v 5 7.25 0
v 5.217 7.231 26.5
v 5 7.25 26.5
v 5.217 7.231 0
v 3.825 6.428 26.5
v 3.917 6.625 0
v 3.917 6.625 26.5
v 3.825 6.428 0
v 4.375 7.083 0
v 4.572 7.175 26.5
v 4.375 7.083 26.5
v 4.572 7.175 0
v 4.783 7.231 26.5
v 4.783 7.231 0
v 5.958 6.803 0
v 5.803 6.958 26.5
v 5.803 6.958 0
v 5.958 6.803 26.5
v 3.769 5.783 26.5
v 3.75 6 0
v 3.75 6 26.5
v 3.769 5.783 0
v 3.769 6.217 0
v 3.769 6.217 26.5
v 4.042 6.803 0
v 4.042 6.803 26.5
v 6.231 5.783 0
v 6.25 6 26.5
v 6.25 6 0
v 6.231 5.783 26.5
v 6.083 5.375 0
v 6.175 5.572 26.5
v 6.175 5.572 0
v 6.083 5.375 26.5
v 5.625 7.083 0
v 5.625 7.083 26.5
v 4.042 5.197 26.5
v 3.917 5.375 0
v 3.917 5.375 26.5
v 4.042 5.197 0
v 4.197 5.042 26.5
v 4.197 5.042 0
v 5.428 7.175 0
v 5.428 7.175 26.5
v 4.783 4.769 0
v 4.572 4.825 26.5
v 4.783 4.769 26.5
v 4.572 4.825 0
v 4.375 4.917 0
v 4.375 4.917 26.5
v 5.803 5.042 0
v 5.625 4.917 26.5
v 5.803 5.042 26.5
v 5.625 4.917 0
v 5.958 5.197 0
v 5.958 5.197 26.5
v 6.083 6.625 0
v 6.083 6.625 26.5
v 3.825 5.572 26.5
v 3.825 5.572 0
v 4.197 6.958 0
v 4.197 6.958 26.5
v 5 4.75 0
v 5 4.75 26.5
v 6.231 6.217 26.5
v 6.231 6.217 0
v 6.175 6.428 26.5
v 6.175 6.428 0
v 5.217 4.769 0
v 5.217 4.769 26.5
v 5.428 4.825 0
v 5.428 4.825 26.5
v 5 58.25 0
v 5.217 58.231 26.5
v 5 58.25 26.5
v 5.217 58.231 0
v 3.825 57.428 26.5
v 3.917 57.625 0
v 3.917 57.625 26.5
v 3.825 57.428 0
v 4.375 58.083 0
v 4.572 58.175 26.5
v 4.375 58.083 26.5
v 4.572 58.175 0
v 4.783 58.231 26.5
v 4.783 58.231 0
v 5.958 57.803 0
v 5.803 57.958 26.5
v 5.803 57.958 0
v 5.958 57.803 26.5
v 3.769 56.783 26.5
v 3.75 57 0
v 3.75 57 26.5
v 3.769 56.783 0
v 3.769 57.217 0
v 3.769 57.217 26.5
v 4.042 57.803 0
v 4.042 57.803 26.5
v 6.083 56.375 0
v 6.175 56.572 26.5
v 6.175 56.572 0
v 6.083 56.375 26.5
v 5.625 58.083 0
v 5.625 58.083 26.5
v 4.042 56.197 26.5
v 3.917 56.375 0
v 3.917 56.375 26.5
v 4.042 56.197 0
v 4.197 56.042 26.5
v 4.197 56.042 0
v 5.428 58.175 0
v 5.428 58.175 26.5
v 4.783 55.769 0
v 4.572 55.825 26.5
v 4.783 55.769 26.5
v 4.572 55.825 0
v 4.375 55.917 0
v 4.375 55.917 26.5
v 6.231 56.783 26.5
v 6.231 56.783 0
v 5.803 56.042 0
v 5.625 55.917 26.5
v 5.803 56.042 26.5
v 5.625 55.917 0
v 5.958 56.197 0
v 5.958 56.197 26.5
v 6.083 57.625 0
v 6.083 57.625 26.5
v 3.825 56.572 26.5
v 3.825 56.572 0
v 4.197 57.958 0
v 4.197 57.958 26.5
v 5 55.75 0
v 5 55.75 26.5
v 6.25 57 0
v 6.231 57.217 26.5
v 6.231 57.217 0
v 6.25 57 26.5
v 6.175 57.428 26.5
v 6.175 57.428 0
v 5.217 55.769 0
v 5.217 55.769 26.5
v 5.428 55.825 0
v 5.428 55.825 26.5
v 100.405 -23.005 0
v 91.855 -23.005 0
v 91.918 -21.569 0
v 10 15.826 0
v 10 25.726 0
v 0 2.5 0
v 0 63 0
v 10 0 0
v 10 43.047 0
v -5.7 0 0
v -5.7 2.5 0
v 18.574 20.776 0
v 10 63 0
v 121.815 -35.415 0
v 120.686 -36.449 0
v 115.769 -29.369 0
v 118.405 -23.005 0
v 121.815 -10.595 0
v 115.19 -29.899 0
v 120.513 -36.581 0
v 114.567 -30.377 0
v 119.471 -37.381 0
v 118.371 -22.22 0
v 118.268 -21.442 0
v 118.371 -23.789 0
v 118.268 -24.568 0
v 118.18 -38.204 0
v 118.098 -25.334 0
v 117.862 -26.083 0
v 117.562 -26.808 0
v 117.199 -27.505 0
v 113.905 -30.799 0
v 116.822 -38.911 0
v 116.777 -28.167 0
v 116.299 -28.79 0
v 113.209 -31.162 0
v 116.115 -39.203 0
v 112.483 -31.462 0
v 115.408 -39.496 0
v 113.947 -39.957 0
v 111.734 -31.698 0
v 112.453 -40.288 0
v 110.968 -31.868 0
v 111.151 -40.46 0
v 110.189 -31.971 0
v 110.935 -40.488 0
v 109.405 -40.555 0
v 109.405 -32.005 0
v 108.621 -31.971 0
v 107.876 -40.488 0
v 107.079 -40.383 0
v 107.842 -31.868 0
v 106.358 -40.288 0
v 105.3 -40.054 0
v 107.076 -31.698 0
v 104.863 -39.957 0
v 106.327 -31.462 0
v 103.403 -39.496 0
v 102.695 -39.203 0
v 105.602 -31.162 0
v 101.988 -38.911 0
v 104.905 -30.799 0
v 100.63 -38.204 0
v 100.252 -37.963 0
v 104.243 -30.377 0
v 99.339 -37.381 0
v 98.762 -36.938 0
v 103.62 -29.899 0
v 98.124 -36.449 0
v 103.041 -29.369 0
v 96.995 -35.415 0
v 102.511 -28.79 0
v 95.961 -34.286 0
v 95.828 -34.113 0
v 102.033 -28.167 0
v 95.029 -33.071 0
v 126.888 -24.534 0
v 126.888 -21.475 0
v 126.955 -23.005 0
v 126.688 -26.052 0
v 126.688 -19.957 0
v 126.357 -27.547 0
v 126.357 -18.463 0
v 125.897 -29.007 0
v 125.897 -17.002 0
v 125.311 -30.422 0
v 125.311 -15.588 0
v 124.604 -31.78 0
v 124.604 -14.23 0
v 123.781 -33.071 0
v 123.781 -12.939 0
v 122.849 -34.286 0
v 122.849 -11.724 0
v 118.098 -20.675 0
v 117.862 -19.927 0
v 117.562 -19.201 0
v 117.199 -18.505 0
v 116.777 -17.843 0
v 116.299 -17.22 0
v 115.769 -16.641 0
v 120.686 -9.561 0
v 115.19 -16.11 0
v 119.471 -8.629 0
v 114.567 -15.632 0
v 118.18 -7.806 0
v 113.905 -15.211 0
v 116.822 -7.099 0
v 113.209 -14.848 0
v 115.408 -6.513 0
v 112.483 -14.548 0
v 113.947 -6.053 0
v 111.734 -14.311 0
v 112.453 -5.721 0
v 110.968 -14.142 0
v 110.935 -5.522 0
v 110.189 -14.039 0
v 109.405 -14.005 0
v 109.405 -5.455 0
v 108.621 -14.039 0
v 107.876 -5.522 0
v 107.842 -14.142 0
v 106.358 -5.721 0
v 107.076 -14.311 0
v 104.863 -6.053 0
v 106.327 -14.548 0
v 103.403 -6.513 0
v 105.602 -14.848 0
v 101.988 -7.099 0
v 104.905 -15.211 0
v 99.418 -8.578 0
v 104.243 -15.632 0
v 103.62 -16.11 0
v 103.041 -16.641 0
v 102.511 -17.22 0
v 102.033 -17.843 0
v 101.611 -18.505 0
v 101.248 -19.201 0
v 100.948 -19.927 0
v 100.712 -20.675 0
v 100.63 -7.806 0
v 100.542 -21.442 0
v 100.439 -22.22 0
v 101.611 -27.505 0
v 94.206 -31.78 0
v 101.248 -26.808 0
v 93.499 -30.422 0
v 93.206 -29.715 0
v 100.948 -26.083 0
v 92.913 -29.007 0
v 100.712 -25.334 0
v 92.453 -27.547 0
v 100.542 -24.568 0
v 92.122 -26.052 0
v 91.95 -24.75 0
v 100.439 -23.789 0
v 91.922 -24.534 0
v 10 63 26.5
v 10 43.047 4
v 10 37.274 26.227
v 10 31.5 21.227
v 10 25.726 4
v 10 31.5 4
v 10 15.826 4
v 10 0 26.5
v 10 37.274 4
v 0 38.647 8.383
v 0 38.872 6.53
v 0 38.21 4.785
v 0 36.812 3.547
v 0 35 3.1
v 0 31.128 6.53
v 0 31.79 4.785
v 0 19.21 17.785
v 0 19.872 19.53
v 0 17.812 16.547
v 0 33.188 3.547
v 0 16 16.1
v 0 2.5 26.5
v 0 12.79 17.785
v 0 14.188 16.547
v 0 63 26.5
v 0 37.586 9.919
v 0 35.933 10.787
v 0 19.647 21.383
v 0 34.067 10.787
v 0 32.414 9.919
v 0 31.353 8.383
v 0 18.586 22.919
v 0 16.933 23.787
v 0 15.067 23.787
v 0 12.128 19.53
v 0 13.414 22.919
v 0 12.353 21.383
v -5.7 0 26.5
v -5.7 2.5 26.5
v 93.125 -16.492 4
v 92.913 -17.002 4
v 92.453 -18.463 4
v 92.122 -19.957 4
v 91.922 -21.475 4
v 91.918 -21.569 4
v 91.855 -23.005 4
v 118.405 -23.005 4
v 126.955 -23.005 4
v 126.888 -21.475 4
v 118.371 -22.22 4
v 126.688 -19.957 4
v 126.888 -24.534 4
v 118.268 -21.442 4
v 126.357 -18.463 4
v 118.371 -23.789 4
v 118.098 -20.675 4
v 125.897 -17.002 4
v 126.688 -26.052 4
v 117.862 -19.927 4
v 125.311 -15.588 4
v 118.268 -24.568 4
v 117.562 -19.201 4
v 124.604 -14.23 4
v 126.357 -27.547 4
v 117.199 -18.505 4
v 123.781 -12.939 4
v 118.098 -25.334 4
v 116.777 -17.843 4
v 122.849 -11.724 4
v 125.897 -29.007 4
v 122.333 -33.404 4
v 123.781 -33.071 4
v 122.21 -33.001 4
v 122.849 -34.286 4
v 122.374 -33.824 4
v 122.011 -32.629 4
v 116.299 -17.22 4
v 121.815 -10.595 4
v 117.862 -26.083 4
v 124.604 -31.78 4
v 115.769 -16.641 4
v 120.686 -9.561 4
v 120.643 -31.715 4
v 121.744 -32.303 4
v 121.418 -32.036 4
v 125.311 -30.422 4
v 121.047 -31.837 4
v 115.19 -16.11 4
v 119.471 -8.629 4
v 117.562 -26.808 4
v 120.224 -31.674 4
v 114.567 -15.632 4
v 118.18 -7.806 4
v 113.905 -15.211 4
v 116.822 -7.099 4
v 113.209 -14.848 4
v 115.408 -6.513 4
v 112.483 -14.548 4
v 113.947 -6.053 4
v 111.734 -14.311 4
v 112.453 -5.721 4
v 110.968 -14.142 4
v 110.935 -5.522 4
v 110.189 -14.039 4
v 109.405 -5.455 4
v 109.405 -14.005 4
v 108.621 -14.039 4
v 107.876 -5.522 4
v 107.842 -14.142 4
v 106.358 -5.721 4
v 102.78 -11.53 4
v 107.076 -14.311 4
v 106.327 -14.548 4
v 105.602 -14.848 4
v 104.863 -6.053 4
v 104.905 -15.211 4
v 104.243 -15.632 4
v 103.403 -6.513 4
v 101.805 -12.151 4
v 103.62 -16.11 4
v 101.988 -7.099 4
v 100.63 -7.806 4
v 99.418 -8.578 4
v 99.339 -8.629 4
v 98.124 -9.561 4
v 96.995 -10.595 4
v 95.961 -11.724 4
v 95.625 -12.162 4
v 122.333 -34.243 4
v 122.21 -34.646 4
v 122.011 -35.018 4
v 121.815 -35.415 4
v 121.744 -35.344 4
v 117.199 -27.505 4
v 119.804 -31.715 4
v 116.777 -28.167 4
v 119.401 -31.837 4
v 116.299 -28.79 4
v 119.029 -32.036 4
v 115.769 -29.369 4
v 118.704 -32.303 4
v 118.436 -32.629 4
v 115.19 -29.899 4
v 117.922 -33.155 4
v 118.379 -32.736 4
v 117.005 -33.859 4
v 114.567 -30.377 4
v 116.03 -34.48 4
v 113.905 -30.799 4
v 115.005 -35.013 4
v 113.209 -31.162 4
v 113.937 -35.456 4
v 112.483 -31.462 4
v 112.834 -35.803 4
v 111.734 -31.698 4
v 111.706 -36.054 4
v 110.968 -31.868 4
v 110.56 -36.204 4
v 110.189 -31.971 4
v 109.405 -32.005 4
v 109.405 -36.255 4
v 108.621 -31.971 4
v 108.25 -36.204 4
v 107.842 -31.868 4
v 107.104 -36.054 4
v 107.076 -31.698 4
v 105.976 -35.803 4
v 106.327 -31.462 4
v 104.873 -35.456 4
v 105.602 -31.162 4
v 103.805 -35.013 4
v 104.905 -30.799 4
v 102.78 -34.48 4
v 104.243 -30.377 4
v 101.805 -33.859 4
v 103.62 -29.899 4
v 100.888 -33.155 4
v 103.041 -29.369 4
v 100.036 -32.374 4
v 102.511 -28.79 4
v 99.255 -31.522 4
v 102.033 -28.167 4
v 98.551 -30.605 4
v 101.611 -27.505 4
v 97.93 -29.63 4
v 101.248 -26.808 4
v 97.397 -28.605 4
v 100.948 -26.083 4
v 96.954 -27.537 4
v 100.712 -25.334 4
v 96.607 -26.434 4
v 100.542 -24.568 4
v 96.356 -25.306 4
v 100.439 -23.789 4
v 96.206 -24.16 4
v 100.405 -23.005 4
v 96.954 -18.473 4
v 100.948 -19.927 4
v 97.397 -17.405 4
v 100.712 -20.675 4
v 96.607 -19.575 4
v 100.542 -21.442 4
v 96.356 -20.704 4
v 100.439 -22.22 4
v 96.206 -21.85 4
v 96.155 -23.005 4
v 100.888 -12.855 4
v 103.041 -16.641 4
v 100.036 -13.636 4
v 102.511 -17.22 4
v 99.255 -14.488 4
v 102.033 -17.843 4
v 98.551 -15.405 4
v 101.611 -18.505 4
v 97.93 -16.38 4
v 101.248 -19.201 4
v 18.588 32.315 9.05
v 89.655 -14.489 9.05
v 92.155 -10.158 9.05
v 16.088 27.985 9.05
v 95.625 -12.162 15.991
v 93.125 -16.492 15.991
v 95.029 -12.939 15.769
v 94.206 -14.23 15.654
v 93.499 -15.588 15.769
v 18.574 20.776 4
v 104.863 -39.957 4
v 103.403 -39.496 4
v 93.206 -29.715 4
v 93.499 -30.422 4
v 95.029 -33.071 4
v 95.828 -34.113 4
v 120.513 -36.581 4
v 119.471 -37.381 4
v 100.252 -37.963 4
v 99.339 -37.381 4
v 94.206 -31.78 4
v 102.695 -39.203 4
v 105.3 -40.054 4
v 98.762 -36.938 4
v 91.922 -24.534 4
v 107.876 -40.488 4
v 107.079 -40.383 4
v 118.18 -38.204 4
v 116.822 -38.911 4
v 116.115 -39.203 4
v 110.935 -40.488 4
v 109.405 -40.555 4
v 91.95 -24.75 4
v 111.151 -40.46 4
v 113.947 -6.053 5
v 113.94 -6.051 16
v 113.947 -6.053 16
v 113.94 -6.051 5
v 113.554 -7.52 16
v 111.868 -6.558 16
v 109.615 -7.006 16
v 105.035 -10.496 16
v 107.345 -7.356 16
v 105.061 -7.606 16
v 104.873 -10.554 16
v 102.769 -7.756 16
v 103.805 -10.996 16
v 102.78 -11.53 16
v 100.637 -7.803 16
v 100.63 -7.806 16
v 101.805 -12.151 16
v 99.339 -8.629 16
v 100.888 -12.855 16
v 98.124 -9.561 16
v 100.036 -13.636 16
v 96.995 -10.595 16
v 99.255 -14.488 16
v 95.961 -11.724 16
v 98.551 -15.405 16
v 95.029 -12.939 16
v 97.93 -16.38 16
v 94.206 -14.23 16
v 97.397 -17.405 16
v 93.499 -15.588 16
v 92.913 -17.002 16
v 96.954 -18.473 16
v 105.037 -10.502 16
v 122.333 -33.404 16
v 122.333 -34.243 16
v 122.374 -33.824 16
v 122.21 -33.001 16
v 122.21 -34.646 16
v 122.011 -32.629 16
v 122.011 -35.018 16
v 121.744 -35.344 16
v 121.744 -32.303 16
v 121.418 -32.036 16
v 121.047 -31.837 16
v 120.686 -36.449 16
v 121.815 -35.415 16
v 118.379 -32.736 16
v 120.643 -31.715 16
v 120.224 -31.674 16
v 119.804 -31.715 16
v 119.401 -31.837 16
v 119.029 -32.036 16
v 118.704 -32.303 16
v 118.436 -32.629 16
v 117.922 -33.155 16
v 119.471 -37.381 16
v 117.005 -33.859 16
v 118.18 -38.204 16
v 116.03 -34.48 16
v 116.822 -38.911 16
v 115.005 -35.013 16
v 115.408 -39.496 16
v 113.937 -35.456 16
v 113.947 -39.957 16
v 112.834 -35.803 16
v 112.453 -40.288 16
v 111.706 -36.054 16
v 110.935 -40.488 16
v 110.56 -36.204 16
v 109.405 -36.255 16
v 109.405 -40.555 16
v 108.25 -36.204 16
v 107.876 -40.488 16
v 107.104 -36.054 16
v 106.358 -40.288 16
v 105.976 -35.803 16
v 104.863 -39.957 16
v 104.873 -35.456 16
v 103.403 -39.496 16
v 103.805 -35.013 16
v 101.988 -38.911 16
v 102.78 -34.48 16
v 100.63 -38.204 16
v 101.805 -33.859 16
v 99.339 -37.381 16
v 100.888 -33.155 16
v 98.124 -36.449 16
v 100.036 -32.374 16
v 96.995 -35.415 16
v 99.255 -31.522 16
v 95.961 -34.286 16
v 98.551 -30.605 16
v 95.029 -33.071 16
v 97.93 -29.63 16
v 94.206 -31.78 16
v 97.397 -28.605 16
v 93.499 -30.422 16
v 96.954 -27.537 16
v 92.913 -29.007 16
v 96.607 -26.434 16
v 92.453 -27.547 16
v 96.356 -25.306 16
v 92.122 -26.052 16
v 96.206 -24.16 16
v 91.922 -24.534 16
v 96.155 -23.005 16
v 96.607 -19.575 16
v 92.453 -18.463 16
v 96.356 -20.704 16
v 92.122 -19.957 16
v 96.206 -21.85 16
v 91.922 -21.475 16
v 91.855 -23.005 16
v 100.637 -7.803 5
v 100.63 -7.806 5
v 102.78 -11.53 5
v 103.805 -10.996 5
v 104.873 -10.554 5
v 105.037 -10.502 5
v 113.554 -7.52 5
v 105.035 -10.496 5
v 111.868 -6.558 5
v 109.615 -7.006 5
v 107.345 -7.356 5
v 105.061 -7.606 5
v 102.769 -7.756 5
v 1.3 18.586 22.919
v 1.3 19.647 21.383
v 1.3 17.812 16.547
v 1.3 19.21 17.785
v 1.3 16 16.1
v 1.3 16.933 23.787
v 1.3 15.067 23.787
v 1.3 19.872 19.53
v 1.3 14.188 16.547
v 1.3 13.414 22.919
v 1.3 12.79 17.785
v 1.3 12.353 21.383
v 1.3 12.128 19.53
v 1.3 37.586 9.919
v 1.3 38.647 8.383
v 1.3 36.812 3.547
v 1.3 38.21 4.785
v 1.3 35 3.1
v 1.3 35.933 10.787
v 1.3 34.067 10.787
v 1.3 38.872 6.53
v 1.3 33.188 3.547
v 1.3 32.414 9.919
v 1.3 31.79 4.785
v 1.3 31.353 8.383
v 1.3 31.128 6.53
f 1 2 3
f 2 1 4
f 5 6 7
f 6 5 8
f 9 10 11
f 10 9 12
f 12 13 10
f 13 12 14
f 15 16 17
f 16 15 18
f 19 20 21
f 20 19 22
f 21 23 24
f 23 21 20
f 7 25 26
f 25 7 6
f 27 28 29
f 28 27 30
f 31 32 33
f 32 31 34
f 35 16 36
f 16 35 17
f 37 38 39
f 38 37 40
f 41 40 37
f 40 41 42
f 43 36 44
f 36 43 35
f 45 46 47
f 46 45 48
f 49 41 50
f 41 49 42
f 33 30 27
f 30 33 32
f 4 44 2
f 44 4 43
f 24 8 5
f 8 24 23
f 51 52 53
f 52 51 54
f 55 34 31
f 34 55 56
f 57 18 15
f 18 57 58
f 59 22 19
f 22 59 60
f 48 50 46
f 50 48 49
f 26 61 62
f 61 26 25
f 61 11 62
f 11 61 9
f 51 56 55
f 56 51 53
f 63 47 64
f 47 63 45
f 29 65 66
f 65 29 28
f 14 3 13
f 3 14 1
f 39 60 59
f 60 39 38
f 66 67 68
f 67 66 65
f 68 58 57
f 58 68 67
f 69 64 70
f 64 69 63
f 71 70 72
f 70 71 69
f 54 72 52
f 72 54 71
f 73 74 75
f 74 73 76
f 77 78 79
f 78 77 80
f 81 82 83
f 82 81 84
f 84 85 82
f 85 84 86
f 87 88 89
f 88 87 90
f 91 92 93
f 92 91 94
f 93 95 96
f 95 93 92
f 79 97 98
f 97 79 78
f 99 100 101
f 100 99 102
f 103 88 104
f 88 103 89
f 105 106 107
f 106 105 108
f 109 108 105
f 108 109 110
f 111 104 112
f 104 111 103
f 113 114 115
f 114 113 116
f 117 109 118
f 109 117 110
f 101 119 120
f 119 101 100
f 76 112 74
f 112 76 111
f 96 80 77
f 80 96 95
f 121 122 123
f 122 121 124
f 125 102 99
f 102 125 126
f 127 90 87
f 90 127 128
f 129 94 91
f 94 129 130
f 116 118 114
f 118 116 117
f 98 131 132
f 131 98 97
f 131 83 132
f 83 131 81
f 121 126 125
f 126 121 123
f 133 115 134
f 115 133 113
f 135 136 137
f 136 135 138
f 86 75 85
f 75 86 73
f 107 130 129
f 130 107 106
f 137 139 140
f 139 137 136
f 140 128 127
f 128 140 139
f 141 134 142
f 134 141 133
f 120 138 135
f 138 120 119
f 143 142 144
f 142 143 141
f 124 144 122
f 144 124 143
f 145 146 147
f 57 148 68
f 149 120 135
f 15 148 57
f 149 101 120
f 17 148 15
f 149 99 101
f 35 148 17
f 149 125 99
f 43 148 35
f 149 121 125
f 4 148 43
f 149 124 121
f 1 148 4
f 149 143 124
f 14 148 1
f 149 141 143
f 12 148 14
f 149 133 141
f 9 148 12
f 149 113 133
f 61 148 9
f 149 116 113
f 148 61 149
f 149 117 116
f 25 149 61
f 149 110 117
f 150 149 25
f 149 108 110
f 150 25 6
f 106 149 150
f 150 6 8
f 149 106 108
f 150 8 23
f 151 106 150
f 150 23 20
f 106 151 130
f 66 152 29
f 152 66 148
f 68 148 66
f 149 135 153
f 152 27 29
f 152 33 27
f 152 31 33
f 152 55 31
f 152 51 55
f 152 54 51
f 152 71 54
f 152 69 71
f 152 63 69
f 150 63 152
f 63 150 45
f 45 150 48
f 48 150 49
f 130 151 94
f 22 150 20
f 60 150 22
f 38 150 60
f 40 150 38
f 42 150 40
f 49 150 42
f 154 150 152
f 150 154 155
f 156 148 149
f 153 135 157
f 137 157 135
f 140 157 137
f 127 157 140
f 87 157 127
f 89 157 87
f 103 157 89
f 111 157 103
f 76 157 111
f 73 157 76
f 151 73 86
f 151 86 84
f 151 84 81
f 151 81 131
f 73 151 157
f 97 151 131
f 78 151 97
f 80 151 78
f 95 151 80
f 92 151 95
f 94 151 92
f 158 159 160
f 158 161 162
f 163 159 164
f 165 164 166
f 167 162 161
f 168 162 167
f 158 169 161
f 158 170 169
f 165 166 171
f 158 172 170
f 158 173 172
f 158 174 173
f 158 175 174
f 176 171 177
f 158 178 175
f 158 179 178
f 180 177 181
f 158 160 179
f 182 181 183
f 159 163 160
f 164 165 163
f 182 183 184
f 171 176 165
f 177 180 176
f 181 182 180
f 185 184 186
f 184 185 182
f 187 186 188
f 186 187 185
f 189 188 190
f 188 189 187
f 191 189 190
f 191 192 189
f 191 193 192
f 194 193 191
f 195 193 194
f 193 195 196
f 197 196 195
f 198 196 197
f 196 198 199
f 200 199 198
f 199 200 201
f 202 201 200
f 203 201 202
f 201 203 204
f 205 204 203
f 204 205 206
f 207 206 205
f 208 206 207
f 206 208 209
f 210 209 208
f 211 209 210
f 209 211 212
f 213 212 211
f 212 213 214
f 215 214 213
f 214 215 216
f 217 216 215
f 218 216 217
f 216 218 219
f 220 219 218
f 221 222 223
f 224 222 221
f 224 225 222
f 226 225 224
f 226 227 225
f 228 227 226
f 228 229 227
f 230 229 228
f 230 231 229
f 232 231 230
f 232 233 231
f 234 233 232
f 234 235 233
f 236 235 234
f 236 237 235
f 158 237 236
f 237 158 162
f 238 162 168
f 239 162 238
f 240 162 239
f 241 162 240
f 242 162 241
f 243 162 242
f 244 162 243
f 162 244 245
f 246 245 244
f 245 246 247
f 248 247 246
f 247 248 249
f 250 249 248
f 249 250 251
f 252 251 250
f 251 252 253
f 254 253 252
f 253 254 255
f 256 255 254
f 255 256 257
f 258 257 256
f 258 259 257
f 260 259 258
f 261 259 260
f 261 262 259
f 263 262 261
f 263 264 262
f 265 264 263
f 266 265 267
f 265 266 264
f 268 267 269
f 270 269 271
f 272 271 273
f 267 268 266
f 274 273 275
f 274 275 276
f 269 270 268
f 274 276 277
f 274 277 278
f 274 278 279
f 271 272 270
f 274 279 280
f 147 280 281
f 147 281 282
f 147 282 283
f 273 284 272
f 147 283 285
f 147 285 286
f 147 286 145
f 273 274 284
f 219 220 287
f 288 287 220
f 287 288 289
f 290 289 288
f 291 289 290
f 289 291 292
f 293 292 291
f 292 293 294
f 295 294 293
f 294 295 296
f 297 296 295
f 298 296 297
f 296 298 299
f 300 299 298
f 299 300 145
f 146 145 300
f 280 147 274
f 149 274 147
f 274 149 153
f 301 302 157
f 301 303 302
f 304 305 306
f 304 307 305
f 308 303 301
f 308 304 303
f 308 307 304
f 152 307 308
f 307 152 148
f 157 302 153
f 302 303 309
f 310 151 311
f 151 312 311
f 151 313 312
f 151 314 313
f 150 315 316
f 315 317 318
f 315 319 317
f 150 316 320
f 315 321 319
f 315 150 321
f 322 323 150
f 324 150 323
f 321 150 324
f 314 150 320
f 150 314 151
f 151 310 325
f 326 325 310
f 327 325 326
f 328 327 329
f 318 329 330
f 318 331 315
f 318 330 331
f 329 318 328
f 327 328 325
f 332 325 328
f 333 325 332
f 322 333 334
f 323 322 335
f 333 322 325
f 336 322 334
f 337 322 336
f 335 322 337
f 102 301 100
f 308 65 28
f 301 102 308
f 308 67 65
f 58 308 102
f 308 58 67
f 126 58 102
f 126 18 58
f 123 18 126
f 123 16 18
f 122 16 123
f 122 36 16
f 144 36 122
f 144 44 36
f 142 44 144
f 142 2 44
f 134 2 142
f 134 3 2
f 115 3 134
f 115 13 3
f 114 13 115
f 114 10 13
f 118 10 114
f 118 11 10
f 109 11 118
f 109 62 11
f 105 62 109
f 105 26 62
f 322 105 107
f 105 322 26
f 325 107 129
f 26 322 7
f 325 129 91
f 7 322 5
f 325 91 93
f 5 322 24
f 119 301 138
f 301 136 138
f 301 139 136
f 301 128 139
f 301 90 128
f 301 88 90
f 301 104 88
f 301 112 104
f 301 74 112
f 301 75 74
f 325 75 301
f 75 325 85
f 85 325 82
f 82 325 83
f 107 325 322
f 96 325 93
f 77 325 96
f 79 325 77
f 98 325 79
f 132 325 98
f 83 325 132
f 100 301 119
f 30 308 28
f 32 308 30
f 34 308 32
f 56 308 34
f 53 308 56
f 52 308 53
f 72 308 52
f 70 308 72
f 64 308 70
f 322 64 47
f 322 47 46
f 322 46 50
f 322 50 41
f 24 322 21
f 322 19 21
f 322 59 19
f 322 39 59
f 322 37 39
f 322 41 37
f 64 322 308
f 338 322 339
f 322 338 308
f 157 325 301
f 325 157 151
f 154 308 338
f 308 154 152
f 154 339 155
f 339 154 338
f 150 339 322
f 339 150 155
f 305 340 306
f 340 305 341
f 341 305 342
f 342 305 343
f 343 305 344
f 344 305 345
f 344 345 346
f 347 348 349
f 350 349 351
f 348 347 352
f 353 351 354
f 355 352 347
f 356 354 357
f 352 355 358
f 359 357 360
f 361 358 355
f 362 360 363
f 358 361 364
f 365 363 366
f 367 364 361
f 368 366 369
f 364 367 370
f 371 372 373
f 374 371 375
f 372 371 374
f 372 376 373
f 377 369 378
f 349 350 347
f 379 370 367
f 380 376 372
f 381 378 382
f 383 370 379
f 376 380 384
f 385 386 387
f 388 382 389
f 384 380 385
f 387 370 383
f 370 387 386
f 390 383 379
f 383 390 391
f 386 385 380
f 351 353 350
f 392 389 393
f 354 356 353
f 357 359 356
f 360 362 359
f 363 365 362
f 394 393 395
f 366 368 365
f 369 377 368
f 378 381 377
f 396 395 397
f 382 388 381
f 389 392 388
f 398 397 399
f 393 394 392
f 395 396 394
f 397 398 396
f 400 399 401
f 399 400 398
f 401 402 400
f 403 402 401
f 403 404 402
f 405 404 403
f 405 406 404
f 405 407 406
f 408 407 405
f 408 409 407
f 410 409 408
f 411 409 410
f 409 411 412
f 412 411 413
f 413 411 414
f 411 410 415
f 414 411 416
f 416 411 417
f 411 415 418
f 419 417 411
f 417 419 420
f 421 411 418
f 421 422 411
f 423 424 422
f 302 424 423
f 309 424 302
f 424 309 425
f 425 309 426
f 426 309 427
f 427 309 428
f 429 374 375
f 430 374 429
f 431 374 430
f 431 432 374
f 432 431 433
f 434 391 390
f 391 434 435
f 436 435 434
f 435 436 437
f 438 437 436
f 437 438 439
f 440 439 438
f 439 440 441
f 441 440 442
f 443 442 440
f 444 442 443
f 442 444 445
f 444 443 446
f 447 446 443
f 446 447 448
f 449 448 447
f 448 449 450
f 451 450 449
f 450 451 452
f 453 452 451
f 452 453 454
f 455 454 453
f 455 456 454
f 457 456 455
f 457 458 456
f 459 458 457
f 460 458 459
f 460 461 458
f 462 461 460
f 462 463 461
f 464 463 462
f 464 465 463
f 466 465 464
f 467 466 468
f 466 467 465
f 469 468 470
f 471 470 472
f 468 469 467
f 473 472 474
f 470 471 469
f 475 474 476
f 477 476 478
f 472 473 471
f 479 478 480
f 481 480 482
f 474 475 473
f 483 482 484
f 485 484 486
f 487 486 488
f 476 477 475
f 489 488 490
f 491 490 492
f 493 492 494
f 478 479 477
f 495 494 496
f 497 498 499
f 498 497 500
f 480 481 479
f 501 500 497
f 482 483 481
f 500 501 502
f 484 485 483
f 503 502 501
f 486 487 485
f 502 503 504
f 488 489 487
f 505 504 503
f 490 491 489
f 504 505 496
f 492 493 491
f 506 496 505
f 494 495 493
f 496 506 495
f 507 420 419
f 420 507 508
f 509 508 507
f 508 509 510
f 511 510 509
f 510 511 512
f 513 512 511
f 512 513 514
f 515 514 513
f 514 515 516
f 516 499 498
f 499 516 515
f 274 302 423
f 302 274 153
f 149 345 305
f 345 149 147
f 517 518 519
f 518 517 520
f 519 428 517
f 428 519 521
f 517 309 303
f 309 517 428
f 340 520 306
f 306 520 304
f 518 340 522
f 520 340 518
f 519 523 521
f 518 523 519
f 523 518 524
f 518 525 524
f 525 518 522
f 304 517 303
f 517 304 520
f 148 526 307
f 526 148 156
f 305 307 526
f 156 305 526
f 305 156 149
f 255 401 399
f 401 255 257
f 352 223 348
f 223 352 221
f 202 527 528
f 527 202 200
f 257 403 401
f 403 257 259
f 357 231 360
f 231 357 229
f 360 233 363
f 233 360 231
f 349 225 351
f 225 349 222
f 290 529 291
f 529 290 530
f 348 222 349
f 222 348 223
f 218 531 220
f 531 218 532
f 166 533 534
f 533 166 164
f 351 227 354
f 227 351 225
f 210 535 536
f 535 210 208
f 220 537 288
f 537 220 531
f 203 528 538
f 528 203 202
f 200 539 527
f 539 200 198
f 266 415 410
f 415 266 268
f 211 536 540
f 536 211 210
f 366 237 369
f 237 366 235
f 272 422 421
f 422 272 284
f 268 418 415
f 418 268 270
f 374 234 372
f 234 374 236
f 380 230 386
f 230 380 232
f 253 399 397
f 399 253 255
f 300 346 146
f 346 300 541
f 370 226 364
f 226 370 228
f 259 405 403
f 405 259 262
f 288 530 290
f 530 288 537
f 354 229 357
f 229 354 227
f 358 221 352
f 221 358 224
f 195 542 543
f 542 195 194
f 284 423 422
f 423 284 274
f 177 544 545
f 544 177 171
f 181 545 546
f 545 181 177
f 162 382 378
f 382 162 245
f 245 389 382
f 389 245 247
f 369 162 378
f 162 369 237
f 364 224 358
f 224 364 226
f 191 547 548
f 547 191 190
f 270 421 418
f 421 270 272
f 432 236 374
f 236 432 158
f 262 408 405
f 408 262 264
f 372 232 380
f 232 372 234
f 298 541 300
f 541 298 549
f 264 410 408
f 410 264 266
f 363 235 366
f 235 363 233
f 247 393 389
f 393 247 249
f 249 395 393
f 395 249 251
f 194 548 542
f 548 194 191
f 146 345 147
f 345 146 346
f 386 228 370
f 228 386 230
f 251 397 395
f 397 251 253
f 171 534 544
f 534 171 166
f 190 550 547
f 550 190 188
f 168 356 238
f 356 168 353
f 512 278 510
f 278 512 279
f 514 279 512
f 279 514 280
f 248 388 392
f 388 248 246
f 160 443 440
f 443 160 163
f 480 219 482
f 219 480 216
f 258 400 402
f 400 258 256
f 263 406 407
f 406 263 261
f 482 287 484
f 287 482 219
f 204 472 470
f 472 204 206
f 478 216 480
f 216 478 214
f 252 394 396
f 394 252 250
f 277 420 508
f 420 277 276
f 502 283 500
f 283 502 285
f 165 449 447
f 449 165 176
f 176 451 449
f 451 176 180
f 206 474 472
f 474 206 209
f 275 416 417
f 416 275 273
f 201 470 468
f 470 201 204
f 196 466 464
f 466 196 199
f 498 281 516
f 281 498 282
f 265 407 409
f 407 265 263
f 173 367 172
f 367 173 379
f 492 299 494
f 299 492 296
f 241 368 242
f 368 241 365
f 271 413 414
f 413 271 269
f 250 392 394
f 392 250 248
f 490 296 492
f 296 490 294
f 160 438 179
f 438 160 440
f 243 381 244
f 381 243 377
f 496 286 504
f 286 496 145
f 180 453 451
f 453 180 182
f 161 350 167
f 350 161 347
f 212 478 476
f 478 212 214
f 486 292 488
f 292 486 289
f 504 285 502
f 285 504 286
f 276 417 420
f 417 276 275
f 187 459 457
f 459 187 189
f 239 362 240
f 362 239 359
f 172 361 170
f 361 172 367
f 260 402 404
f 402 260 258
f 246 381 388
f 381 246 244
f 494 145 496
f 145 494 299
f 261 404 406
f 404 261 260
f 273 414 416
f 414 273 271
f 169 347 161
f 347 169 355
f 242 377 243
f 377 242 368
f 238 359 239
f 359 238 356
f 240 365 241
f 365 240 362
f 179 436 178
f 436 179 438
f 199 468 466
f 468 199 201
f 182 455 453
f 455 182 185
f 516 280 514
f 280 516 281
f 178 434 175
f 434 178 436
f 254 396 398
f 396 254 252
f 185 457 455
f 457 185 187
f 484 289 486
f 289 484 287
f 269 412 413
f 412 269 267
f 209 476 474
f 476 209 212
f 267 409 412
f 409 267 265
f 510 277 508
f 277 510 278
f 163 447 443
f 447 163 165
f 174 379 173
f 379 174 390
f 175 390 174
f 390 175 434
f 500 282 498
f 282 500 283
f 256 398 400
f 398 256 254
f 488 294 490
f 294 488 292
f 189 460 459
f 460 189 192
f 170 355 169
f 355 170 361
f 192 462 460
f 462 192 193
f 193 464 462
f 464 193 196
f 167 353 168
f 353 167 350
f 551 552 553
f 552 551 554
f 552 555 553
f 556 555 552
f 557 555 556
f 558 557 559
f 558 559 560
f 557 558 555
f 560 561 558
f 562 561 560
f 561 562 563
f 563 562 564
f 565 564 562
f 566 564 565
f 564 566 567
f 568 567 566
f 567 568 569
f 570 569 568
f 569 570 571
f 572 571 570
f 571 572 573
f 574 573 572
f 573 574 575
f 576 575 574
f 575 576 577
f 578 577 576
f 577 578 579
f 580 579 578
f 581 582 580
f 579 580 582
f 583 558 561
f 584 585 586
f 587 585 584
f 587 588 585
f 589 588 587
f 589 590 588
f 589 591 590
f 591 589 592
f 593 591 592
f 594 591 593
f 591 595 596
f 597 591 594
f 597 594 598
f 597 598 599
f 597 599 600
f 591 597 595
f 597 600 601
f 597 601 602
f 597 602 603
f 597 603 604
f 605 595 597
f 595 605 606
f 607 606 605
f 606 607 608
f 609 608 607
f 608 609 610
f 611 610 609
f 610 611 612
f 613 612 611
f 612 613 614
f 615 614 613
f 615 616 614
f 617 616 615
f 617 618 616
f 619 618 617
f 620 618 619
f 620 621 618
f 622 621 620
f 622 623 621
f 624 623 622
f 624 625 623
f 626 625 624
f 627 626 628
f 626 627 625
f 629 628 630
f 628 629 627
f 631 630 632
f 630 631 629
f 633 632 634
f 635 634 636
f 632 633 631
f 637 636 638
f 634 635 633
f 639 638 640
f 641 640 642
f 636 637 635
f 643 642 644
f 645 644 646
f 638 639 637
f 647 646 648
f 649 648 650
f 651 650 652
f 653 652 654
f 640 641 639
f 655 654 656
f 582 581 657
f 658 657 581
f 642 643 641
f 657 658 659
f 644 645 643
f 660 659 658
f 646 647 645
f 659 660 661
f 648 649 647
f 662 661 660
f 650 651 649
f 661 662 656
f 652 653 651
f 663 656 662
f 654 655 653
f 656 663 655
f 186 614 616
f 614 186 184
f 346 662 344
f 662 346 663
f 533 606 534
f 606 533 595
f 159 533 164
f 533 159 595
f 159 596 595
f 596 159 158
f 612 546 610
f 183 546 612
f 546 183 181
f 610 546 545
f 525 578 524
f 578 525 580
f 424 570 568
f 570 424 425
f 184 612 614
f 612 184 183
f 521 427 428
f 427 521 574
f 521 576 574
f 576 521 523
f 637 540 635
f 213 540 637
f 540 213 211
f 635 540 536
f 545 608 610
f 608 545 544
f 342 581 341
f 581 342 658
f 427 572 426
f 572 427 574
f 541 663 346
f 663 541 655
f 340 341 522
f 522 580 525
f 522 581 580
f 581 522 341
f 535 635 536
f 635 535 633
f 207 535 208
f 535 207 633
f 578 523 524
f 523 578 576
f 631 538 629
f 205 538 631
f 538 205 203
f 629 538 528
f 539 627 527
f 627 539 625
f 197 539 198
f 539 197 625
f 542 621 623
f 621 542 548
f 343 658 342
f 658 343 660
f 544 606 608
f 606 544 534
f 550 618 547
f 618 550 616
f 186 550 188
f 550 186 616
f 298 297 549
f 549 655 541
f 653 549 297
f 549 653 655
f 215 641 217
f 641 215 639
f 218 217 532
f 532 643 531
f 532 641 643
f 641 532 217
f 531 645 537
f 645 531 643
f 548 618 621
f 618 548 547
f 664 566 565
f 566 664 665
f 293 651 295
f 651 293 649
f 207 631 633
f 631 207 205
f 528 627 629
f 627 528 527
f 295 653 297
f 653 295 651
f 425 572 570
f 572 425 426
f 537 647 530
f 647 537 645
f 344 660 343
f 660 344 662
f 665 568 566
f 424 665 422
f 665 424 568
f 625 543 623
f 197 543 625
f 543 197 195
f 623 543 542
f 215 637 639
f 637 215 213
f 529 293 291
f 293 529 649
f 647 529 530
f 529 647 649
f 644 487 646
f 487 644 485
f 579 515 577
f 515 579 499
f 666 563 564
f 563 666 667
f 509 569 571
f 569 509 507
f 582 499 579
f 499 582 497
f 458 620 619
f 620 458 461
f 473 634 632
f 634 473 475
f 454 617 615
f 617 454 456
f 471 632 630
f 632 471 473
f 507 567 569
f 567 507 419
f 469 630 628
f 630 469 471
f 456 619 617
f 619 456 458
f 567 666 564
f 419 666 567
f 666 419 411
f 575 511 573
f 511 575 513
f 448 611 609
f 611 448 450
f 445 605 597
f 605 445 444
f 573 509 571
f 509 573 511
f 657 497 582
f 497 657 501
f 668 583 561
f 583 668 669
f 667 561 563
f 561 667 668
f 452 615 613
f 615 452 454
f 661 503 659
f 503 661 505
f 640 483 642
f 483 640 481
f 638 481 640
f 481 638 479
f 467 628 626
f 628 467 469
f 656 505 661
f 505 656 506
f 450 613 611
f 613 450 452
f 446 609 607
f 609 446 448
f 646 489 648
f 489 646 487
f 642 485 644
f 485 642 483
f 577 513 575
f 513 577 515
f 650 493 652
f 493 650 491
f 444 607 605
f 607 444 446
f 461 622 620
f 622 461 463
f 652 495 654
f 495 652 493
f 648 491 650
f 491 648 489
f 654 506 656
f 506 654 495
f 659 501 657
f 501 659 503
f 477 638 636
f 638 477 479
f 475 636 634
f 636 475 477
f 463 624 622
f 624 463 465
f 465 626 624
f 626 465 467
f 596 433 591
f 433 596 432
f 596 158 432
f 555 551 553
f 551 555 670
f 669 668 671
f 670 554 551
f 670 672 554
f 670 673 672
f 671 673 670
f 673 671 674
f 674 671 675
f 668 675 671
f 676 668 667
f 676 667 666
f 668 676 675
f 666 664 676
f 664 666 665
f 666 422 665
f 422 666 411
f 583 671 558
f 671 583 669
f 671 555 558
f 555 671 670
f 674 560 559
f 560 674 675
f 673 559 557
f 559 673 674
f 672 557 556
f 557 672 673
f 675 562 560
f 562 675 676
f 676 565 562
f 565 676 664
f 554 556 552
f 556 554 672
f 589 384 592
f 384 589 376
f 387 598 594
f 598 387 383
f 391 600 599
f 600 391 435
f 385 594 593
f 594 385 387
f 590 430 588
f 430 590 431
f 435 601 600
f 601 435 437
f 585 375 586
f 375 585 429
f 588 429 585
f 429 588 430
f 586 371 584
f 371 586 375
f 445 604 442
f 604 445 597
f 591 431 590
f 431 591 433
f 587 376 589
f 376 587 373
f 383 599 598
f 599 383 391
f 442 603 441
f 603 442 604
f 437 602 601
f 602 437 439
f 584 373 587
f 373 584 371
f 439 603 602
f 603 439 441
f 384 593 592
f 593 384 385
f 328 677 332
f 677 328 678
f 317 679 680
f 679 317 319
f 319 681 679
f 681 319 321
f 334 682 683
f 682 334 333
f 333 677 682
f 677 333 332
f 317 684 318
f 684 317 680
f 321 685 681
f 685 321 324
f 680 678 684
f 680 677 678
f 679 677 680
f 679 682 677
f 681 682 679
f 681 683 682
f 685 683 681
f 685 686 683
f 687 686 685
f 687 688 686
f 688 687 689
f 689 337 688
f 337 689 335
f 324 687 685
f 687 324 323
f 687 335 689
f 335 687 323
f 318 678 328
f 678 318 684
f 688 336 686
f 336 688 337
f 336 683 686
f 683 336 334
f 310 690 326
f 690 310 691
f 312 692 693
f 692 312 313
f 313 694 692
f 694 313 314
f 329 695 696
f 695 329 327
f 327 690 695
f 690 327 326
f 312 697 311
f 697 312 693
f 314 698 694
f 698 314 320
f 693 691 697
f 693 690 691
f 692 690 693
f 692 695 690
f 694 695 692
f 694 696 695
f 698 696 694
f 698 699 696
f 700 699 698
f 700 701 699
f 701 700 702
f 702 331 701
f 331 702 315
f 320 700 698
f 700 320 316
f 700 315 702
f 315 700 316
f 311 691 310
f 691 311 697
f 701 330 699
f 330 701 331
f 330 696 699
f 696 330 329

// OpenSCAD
part = "lt"; // [rt:Right tower,lt:Left tower,orb:Outer right bracket,olb:Outer left bracket,irb:Inner right bracket,ilb:Inner left bracket,rtb:Right tower with bracket,ltb:Left tower with bracket]

// How you plan to mount the holder
positioning = 1; // [0:Anywhere along top frame,1:Flush against back (notched brackets)]

// Extra length for back lip, when positioning is flush against back
back_lip_extra_length = 2; // [0:5]

// Arm length; pipe distance from top of printer is arm_length*cos(arm_angle) - clip_inner_diameter/2
arm_length = 122;  // [110:180]
// Arm inclination (towards back); default 30
arm_angle = 30; // [5:45]

// Length of base
base_size = 63;  // [63:73]

// Inner diameter of pipe clip
clip_inner_diameter = 26.5; // [26.4:.75in pipe (tight),26.7:.75in pipe (exact),33.2:1in pipe (tight),33.4:1in pipe (exact)]
// Thickness of pipe clip; must be smaller or equal to clip head thickness (keep larger than 4)
clip_thickness = 8.6;
// Diameter of clip end hole
clip_head_inner_diameter = 18; // [0:23]
// Clip end rim size
clip_head_rim_thickness = 0; // [0:10]
// Clip lip thickness
clip_edge_thickness = 1.5;
// Clip rotation; you may want to adjust if you change arm_angle (30-arm_angle will keep gap orientation unchanged)
clip_angle = 0; // [-20:30]
// Clip lip curvature multiplier (1 to 3 recommended; higher is less curved)
clip_lip_curvature = 1.5;
// Arm side buttress base width; may want to adjust if you change arm angle
arm_buttress_width = 10; // [3:15]

/* [Hidden] */

back_pos = (positioning != 0);

// Base parameters
base_d = base_size;
base_h = 10;
base_w = 26.5;
screw_r = 1.25;
screw_dist = 51;

// Arm parameters
arm_len = arm_length;
arm_thk = 4;
arm_w = 15;
arm_rib = 5;
//arm_angle = 30;
arm_butt_w = arm_buttress_width;


// Clip parameters
clip_h = 4;
clip_od = clip_inner_diameter + clip_thickness + clip_head_rim_thickness;
clip_id = clip_head_inner_diameter;
lip_h = 16;  // includes clip_h
lip_od = clip_inner_diameter + clip_thickness;
lip_id = clip_inner_diameter;
lip_edge_thk = clip_edge_thickness;
lip_phi = 120;
lip_dphi = 75 + clip_angle;
lip_gap_phi = 45;
lip_gap_dphi = lip_dphi - lip_gap_phi;
lip_gap_h = 1;
lip_shave_r = lip_od*clip_lip_curvature;

// Solidoodle frame
sd_slack = 0.2;
sd_frame_thk = 1 + sd_slack;   // sheet metal
sd_toph_w = 26 + sd_slack;  // horizontal
sd_backv_w = 45.5 + sd_slack;  // vertical

rivet_r = 6.3/2 + 0.75;
rivet_h = 1 + 0.3;

// Bracket parameters
bracket_len = base_d;
bracket_thk = 2.5;
bracket_screw_r = 1.75;
bracket_screw_head_r = 2.75;
bracket_screw_head_h = 1.25;
bracket_screw_hole_dist = screw_dist;
bracket_screw_hole_ofs = 5;

// Extra
back_lip_len = bracket_thk + sd_frame_thk + back_lip_extra_length;  // same as inner bracket width

// phi <= 180
module cylinder_hollow(h, od, id, phi, d_phi=0) {
  rotate([0,0,d_phi]) difference() {
    cylinder(h, od/2, od/2, $fn=72);
    translate([0,0,-0.1]) cylinder(h+0.2, id/2, id/2, $fn=72);
    if (phi != 0) {
      translate([0,0,-0.1]) linear_extrude(height=h+0.2, twist=0) polygon([[0,0], [od,0], [cos(phi/2)*od, sin(phi/2)*od], [cos(phi)*od, sin(phi)*od]], convexity=2);
    }
  }
}

// phi <= 180
module cylinder_hollow_n(h, od, id, phi, d_phi=0) {
  rotate([0,0,d_phi]) intersection() {
    difference() {
      cylinder(h, od/2, od/2, $fn=72);
      translate([0,0,-0.1]) cylinder(h+0.2, id/2, id/2, $fn=72);
    }
    translate([0,0,-0.1]) linear_extrude(height=h+0.2, twist=0) polygon([[0,0], [od,0], [cos(phi/2)*od, sin(phi/2)*od], [cos(phi)*od, sin(phi)*od]], convexity=2);
  }
}

module buttress_w(thk, w, phi) {
  h = w*tan(phi);
  linear_extrude(height=thk, twist=0) polygon([[0,0],[w,0],[w,h]], convexity=2);
}

module buttress_h(thk, h, phi) {
  w = h/tan(phi);
  linear_extrude(height=thk, twist=0) polygon([[0,0],[w,0],[w,h]], convexity=2);
}




module base(lt_holes=true, rt_holes=true) {
  difference() {
    cube([base_w, base_d, base_h]);
    if (rt_holes) {
      translate([-1, (base_d-screw_dist)/2, base_h/2]) rotate([0,90,0]) cylinder(base_w/2+1+1,screw_r,screw_r, $fn=36);
      translate([-1, (base_d+screw_dist)/2, base_h/2]) rotate([0,90,0]) cylinder(base_w/2+1+1,screw_r,screw_r, $fn=36);
    }
    if (lt_holes) {
      translate([-1+base_w/2, (base_d-screw_dist)/2, base_h/2]) rotate([0,90,0]) cylinder(base_w/2+1+1,screw_r,screw_r, $fn=36);
      translate([-1+base_w/2, (base_d+screw_dist)/2, base_h/2]) rotate([0,90,0]) cylinder(base_w/2+1+1,screw_r,screw_r, $fn=36);
    }
    *union() {  // Test print only 
      translate([-1, -base_d/2-2.5, 0]) cube([base_w, base_d, base_h]);
      translate([-1, base_d/2+2.5, 0]) cube([base_w, base_d, base_h]);
    }
  }
  if (back_pos) {
    translate([0,0,-back_lip_len]) cube([base_w, bracket_thk, back_lip_len+base_h]);
  }
}

module arm(left=0) {
  sb = left;
  ss = 1 - 2*sb;
  l = arm_len - sqrt(clip_od*clip_od - arm_w*arm_w)/2 + 0.2;
  union() {
    // Main
    cube([arm_thk, arm_w, l]);
    // Reinforcement
    translate([-sb*arm_rib + ss*0.05, (arm_w-arm_rib)/2, 0]) cube([arm_thk+arm_rib,arm_rib, l]);
    // Clip buttress
    translate([ss*lip_h + sb*arm_thk, (arm_w+ss*arm_rib)/2, arm_len-lip_od/2+0.2]) rotate([-90,0,(1-sb)*180]) buttress_w(arm_rib,lip_h-arm_rib-arm_thk, 30);
    // Side buttress
    translate([ss*(base_w - 0.1) + sb*arm_thk, (arm_w-ss*arm_rib)/2, base_h/cos(arm_angle)-tan(arm_angle)*(arm_w+arm_rib)/2 - 0.1]) rotate([-90, 180, sb*180]) buttress_w(arm_rib, base_w-arm_rib-arm_thk, 30);
    // Back buttress
    translate([arm_thk,0,base_h/cos(arm_angle)-0.1]) rotate([90,-arm_angle,-90]) linear_extrude(height=arm_thk, twist=0) polygon([[0,0],[arm_butt_w,0],[0.5*arm_butt_w,0.5*arm_butt_w*tan(90-arm_angle)]], convexity=2);
  }
}

module clip(left=0) {
  sb = left;  // 0,1
  ss = 1 - 2*sb;  // 0,1 -> 1,-1
  union() {
    cylinder_hollow(clip_h,clip_od,clip_id,0);
    translate([0,0,-sb*(lip_h-clip_h)]) difference() {
      cylinder_hollow(lip_h, lip_od, lip_id, lip_phi, lip_dphi);
      translate([0,0,sb*(lip_h-clip_h-lip_gap_h)]) cylinder_hollow_n(clip_h+lip_gap_h, lip_od+1, lip_id-1, lip_gap_phi+1, lip_gap_dphi);
      translate([0,0,ss*0.1]) rotate([0,0,lip_dphi-acos((lip_id/2)/(lip_od/2-lip_edge_thk))+0.1]) linear_extrude(height=lip_h+0.2, twist=0) polygon([[0,0], [lip_id/2,0], [lip_id/2, sqrt(pow(lip_od/2-lip_edge_thk,2)-pow(lip_id/2,2))]], convexity=2);
      translate([0,0,ss*0.1]) rotate([0,0,lip_dphi-lip_gap_phi/2]) translate([0.5*lip_od*cos(lip_gap_phi/2)+lip_shave_r*sqrt(1-pow(0.5*sin(lip_gap_phi/2)*lip_od/lip_shave_r,2)), 0, 0]) cylinder(lip_h+0.2, lip_shave_r, lip_shave_r, $fn=144);
    }
    translate([0,0,-sb*(lip_h-clip_h)]) union() {
      rotate([0,0,lip_phi+lip_dphi]) translate([(lip_id+lip_od)/4-0.1,0,0]) cylinder(lip_h, (lip_od-lip_id)/4, (lip_od-lip_id)/4, $fn=32);
      %rotate([0,0, lip_dphi]) translate([(lip_od-lip_edge_thk)/2-0.03, 0, 0]) cylinder(lip_h, lip_edge_thk/2, lip_edge_thk/2, $fn=32);
      // Extra support
      // TODO: radial offset not properly parameterized
      *rotate([0,0, lip_dphi - lip_gap_phi/2]) translate([(lip_od-4*lip_edge_thk)/2, 0, 0]) cylinder(lip_h, lip_edge_thk/2, lip_edge_thk/2, $fn=32);
    }
  }
}

module tower(left=0, lt_holes=true, rt_holes=true) {
  sb = left;  // 0,1
  ss = 1 - 2*sb;  // 0,1 -> 1,-1
  difference() {
    union() {  
      base(lt_holes, rt_holes);
      // Arm and clip assembly
      translate([sb*(base_w-arm_thk), base_d/2, 0]) rotate([arm_angle,0,0]) union() {
        arm(left);
        translate([0, arm_w/2, arm_len]) rotate([0, 90, 0]) clip(left);
      }
    }
    if (back_pos) {
      if (left == 0) {
        translate([0,bracket_thk,-1] + [20,13.5,0]) cylinder(r=rivet_r, h=rivet_h+1);
        translate([0,bracket_thk,-1] + [7,32.5,0]) cylinder(r=rivet_r, h=rivet_h+1);
      } else {
        translate([base_w,bracket_thk,-1]+[-20,13.5,0]) cylinder(r=rivet_r, h=rivet_h+1);
        translate([base_w,bracket_thk,-1]+[-7,32.5,0]) cylinder(r=rivet_r, h=rivet_h+1);
      }
    }
  }
}


module bracket_screw_hole() {
  union() {
    cylinder(bracket_thk+1, bracket_screw_r, bracket_screw_r, $fn=18);
    cylinder(bracket_screw_head_h, bracket_screw_head_r, bracket_screw_r, $fn=18);
    translate([0,0,-1+0.05]) cylinder(1, bracket_screw_head_r, bracket_screw_head_r, $fn=18);
  }
}

module bracket(inner = 0, left=0, holes=true) {
  bb = back_pos ? 1 : 0;
  bracket_w = base_h + bracket_thk + inner*sd_frame_thk + (1-inner)*sd_toph_w;
  difference() {
    union() {
      cube([bracket_w, bracket_thk, bracket_len]);
      translate([bracket_w-bracket_thk,0,bb*(inner*(1-left) + (1-inner)*left)*(sd_backv_w+bracket_thk)]) cube([bracket_thk, 2*bracket_thk, bracket_len-bb*(sd_backv_w+bracket_thk)]);
echo(bracket_len-bb*(sd_backv_w+bracket_thk));
      if (back_pos) {
        if (inner == 0) {
          translate([base_h+back_lip_len,0,(1-left)*(bracket_len-bracket_thk)]) cube([bracket_w-base_h-back_lip_len,bracket_thk+back_lip_len,bracket_thk]);
        } else {
          translate([0,0,left*(bracket_len-bracket_thk)]) cube([base_h+back_lip_len,bracket_thk,bracket_thk]);
        }
      }
    }
    if (holes) {
      translate([bracket_screw_hole_ofs, 0, (bracket_len-bracket_screw_hole_dist)/2]) rotate([-90,0,0]) bracket_screw_hole();
      translate([bracket_screw_hole_ofs, 0, (bracket_len+bracket_screw_hole_dist)/2]) rotate([-90,0,0]) bracket_screw_hole();
    }
    if (back_pos && (inner != 0)) {
      translate([base_h,0,bracket_thk+left*(bracket_len-sd_backv_w-2*bracket_thk)]) cube([bracket_w-base_h, bracket_thk,sd_backv_w]);
    }
    if (back_pos && (inner == 0)) {
      if (left == 0) {
        translate([base_h,bracket_thk+1,bracket_len-bracket_thk] + [6.75,0,-38.5]) rotate([90,0,0]) cylinder(r=rivet_r, h=rivet_h+1);
        translate([base_h,bracket_thk+1,bracket_len-bracket_thk] + [19.75,0,-13.5]) rotate([90,0,0]) cylinder(r=rivet_r, h=rivet_h+1);
      } else {
        translate([base_h,bracket_thk+1,bracket_thk] + [6.75,0,38.5]) rotate([90,0,0]) cylinder(r=rivet_r, h=rivet_h+1);
        translate([base_h,bracket_thk+1,bracket_thk] + [19.75,0,13.5]) rotate([90,0,0]) cylinder(r=rivet_r, h=rivet_h+1);
      }
    }
  }
}


module main(part="rt") {
  if (part == "rt") {
    rotate([0,-90,0]) tower(0);
  } else if (part == "lt") {
    translate([0, 0, base_w]) rotate([0, 90, 0]) tower(1);
  } else if (part == "rtb") {
    rotate([0,-90,0]) union() {
      tower(0,rt_holes=false);
      translate([-bracket_thk,base_d,base_h]) rotate([0,90,-90]) bracket(0,0,holes=false);
    }
  } else if (part == "ltb") {  
    translate([0, 0, base_w]) rotate([0, 90, 0]) union() {
      tower(1,lt_holes=false);
      translate([base_w+bracket_thk,0,base_h]) rotate([0,90,90]) bracket(0,1,holes=false);
    }
  } else if (part == "orb") {
    rotate([90, 0, 0]) bracket(0,0);
  } else if (part == "irb") {
    rotate([90, 0, 0]) bracket(1,0);
  } else if (part == "olb") {
    rotate([90, 0, 0]) bracket(0,1);
  } else if (part == "ilb") {
    rotate([90, 0, 0]) bracket(1,1);
  } else if (part == "dbgr") {  // Debug right
    tower(0);
    # translate([base_w+bracket_thk,0,base_h]) rotate([90,90,180]) bracket(1,0);
    # translate([-bracket_thk,base_d,base_h]) rotate([90,90,0]) bracket(0,0);
  } else if (part == "dbgl") {
    tower(1);
    # translate([base_w+bracket_thk,0,base_h]) rotate([90,90,180]) bracket(0,1);
    # translate([-bracket_thk,base_d,base_h]) rotate([90,90,0]) bracket(1,1);
  } else if (part == "dbginset") {
    rotate([0,-90,0]) difference() {
      tower(0, false, false);
      translate([-1,-base_d-1,base_h/3]) cube([base_w+2,2*base_d+2,1.5*arm_length+2]);
      translate([-1,45-1,-1]) cube([base_w+2,base_d+2,arm_length+2]);
    }
  }
}

main(part);
